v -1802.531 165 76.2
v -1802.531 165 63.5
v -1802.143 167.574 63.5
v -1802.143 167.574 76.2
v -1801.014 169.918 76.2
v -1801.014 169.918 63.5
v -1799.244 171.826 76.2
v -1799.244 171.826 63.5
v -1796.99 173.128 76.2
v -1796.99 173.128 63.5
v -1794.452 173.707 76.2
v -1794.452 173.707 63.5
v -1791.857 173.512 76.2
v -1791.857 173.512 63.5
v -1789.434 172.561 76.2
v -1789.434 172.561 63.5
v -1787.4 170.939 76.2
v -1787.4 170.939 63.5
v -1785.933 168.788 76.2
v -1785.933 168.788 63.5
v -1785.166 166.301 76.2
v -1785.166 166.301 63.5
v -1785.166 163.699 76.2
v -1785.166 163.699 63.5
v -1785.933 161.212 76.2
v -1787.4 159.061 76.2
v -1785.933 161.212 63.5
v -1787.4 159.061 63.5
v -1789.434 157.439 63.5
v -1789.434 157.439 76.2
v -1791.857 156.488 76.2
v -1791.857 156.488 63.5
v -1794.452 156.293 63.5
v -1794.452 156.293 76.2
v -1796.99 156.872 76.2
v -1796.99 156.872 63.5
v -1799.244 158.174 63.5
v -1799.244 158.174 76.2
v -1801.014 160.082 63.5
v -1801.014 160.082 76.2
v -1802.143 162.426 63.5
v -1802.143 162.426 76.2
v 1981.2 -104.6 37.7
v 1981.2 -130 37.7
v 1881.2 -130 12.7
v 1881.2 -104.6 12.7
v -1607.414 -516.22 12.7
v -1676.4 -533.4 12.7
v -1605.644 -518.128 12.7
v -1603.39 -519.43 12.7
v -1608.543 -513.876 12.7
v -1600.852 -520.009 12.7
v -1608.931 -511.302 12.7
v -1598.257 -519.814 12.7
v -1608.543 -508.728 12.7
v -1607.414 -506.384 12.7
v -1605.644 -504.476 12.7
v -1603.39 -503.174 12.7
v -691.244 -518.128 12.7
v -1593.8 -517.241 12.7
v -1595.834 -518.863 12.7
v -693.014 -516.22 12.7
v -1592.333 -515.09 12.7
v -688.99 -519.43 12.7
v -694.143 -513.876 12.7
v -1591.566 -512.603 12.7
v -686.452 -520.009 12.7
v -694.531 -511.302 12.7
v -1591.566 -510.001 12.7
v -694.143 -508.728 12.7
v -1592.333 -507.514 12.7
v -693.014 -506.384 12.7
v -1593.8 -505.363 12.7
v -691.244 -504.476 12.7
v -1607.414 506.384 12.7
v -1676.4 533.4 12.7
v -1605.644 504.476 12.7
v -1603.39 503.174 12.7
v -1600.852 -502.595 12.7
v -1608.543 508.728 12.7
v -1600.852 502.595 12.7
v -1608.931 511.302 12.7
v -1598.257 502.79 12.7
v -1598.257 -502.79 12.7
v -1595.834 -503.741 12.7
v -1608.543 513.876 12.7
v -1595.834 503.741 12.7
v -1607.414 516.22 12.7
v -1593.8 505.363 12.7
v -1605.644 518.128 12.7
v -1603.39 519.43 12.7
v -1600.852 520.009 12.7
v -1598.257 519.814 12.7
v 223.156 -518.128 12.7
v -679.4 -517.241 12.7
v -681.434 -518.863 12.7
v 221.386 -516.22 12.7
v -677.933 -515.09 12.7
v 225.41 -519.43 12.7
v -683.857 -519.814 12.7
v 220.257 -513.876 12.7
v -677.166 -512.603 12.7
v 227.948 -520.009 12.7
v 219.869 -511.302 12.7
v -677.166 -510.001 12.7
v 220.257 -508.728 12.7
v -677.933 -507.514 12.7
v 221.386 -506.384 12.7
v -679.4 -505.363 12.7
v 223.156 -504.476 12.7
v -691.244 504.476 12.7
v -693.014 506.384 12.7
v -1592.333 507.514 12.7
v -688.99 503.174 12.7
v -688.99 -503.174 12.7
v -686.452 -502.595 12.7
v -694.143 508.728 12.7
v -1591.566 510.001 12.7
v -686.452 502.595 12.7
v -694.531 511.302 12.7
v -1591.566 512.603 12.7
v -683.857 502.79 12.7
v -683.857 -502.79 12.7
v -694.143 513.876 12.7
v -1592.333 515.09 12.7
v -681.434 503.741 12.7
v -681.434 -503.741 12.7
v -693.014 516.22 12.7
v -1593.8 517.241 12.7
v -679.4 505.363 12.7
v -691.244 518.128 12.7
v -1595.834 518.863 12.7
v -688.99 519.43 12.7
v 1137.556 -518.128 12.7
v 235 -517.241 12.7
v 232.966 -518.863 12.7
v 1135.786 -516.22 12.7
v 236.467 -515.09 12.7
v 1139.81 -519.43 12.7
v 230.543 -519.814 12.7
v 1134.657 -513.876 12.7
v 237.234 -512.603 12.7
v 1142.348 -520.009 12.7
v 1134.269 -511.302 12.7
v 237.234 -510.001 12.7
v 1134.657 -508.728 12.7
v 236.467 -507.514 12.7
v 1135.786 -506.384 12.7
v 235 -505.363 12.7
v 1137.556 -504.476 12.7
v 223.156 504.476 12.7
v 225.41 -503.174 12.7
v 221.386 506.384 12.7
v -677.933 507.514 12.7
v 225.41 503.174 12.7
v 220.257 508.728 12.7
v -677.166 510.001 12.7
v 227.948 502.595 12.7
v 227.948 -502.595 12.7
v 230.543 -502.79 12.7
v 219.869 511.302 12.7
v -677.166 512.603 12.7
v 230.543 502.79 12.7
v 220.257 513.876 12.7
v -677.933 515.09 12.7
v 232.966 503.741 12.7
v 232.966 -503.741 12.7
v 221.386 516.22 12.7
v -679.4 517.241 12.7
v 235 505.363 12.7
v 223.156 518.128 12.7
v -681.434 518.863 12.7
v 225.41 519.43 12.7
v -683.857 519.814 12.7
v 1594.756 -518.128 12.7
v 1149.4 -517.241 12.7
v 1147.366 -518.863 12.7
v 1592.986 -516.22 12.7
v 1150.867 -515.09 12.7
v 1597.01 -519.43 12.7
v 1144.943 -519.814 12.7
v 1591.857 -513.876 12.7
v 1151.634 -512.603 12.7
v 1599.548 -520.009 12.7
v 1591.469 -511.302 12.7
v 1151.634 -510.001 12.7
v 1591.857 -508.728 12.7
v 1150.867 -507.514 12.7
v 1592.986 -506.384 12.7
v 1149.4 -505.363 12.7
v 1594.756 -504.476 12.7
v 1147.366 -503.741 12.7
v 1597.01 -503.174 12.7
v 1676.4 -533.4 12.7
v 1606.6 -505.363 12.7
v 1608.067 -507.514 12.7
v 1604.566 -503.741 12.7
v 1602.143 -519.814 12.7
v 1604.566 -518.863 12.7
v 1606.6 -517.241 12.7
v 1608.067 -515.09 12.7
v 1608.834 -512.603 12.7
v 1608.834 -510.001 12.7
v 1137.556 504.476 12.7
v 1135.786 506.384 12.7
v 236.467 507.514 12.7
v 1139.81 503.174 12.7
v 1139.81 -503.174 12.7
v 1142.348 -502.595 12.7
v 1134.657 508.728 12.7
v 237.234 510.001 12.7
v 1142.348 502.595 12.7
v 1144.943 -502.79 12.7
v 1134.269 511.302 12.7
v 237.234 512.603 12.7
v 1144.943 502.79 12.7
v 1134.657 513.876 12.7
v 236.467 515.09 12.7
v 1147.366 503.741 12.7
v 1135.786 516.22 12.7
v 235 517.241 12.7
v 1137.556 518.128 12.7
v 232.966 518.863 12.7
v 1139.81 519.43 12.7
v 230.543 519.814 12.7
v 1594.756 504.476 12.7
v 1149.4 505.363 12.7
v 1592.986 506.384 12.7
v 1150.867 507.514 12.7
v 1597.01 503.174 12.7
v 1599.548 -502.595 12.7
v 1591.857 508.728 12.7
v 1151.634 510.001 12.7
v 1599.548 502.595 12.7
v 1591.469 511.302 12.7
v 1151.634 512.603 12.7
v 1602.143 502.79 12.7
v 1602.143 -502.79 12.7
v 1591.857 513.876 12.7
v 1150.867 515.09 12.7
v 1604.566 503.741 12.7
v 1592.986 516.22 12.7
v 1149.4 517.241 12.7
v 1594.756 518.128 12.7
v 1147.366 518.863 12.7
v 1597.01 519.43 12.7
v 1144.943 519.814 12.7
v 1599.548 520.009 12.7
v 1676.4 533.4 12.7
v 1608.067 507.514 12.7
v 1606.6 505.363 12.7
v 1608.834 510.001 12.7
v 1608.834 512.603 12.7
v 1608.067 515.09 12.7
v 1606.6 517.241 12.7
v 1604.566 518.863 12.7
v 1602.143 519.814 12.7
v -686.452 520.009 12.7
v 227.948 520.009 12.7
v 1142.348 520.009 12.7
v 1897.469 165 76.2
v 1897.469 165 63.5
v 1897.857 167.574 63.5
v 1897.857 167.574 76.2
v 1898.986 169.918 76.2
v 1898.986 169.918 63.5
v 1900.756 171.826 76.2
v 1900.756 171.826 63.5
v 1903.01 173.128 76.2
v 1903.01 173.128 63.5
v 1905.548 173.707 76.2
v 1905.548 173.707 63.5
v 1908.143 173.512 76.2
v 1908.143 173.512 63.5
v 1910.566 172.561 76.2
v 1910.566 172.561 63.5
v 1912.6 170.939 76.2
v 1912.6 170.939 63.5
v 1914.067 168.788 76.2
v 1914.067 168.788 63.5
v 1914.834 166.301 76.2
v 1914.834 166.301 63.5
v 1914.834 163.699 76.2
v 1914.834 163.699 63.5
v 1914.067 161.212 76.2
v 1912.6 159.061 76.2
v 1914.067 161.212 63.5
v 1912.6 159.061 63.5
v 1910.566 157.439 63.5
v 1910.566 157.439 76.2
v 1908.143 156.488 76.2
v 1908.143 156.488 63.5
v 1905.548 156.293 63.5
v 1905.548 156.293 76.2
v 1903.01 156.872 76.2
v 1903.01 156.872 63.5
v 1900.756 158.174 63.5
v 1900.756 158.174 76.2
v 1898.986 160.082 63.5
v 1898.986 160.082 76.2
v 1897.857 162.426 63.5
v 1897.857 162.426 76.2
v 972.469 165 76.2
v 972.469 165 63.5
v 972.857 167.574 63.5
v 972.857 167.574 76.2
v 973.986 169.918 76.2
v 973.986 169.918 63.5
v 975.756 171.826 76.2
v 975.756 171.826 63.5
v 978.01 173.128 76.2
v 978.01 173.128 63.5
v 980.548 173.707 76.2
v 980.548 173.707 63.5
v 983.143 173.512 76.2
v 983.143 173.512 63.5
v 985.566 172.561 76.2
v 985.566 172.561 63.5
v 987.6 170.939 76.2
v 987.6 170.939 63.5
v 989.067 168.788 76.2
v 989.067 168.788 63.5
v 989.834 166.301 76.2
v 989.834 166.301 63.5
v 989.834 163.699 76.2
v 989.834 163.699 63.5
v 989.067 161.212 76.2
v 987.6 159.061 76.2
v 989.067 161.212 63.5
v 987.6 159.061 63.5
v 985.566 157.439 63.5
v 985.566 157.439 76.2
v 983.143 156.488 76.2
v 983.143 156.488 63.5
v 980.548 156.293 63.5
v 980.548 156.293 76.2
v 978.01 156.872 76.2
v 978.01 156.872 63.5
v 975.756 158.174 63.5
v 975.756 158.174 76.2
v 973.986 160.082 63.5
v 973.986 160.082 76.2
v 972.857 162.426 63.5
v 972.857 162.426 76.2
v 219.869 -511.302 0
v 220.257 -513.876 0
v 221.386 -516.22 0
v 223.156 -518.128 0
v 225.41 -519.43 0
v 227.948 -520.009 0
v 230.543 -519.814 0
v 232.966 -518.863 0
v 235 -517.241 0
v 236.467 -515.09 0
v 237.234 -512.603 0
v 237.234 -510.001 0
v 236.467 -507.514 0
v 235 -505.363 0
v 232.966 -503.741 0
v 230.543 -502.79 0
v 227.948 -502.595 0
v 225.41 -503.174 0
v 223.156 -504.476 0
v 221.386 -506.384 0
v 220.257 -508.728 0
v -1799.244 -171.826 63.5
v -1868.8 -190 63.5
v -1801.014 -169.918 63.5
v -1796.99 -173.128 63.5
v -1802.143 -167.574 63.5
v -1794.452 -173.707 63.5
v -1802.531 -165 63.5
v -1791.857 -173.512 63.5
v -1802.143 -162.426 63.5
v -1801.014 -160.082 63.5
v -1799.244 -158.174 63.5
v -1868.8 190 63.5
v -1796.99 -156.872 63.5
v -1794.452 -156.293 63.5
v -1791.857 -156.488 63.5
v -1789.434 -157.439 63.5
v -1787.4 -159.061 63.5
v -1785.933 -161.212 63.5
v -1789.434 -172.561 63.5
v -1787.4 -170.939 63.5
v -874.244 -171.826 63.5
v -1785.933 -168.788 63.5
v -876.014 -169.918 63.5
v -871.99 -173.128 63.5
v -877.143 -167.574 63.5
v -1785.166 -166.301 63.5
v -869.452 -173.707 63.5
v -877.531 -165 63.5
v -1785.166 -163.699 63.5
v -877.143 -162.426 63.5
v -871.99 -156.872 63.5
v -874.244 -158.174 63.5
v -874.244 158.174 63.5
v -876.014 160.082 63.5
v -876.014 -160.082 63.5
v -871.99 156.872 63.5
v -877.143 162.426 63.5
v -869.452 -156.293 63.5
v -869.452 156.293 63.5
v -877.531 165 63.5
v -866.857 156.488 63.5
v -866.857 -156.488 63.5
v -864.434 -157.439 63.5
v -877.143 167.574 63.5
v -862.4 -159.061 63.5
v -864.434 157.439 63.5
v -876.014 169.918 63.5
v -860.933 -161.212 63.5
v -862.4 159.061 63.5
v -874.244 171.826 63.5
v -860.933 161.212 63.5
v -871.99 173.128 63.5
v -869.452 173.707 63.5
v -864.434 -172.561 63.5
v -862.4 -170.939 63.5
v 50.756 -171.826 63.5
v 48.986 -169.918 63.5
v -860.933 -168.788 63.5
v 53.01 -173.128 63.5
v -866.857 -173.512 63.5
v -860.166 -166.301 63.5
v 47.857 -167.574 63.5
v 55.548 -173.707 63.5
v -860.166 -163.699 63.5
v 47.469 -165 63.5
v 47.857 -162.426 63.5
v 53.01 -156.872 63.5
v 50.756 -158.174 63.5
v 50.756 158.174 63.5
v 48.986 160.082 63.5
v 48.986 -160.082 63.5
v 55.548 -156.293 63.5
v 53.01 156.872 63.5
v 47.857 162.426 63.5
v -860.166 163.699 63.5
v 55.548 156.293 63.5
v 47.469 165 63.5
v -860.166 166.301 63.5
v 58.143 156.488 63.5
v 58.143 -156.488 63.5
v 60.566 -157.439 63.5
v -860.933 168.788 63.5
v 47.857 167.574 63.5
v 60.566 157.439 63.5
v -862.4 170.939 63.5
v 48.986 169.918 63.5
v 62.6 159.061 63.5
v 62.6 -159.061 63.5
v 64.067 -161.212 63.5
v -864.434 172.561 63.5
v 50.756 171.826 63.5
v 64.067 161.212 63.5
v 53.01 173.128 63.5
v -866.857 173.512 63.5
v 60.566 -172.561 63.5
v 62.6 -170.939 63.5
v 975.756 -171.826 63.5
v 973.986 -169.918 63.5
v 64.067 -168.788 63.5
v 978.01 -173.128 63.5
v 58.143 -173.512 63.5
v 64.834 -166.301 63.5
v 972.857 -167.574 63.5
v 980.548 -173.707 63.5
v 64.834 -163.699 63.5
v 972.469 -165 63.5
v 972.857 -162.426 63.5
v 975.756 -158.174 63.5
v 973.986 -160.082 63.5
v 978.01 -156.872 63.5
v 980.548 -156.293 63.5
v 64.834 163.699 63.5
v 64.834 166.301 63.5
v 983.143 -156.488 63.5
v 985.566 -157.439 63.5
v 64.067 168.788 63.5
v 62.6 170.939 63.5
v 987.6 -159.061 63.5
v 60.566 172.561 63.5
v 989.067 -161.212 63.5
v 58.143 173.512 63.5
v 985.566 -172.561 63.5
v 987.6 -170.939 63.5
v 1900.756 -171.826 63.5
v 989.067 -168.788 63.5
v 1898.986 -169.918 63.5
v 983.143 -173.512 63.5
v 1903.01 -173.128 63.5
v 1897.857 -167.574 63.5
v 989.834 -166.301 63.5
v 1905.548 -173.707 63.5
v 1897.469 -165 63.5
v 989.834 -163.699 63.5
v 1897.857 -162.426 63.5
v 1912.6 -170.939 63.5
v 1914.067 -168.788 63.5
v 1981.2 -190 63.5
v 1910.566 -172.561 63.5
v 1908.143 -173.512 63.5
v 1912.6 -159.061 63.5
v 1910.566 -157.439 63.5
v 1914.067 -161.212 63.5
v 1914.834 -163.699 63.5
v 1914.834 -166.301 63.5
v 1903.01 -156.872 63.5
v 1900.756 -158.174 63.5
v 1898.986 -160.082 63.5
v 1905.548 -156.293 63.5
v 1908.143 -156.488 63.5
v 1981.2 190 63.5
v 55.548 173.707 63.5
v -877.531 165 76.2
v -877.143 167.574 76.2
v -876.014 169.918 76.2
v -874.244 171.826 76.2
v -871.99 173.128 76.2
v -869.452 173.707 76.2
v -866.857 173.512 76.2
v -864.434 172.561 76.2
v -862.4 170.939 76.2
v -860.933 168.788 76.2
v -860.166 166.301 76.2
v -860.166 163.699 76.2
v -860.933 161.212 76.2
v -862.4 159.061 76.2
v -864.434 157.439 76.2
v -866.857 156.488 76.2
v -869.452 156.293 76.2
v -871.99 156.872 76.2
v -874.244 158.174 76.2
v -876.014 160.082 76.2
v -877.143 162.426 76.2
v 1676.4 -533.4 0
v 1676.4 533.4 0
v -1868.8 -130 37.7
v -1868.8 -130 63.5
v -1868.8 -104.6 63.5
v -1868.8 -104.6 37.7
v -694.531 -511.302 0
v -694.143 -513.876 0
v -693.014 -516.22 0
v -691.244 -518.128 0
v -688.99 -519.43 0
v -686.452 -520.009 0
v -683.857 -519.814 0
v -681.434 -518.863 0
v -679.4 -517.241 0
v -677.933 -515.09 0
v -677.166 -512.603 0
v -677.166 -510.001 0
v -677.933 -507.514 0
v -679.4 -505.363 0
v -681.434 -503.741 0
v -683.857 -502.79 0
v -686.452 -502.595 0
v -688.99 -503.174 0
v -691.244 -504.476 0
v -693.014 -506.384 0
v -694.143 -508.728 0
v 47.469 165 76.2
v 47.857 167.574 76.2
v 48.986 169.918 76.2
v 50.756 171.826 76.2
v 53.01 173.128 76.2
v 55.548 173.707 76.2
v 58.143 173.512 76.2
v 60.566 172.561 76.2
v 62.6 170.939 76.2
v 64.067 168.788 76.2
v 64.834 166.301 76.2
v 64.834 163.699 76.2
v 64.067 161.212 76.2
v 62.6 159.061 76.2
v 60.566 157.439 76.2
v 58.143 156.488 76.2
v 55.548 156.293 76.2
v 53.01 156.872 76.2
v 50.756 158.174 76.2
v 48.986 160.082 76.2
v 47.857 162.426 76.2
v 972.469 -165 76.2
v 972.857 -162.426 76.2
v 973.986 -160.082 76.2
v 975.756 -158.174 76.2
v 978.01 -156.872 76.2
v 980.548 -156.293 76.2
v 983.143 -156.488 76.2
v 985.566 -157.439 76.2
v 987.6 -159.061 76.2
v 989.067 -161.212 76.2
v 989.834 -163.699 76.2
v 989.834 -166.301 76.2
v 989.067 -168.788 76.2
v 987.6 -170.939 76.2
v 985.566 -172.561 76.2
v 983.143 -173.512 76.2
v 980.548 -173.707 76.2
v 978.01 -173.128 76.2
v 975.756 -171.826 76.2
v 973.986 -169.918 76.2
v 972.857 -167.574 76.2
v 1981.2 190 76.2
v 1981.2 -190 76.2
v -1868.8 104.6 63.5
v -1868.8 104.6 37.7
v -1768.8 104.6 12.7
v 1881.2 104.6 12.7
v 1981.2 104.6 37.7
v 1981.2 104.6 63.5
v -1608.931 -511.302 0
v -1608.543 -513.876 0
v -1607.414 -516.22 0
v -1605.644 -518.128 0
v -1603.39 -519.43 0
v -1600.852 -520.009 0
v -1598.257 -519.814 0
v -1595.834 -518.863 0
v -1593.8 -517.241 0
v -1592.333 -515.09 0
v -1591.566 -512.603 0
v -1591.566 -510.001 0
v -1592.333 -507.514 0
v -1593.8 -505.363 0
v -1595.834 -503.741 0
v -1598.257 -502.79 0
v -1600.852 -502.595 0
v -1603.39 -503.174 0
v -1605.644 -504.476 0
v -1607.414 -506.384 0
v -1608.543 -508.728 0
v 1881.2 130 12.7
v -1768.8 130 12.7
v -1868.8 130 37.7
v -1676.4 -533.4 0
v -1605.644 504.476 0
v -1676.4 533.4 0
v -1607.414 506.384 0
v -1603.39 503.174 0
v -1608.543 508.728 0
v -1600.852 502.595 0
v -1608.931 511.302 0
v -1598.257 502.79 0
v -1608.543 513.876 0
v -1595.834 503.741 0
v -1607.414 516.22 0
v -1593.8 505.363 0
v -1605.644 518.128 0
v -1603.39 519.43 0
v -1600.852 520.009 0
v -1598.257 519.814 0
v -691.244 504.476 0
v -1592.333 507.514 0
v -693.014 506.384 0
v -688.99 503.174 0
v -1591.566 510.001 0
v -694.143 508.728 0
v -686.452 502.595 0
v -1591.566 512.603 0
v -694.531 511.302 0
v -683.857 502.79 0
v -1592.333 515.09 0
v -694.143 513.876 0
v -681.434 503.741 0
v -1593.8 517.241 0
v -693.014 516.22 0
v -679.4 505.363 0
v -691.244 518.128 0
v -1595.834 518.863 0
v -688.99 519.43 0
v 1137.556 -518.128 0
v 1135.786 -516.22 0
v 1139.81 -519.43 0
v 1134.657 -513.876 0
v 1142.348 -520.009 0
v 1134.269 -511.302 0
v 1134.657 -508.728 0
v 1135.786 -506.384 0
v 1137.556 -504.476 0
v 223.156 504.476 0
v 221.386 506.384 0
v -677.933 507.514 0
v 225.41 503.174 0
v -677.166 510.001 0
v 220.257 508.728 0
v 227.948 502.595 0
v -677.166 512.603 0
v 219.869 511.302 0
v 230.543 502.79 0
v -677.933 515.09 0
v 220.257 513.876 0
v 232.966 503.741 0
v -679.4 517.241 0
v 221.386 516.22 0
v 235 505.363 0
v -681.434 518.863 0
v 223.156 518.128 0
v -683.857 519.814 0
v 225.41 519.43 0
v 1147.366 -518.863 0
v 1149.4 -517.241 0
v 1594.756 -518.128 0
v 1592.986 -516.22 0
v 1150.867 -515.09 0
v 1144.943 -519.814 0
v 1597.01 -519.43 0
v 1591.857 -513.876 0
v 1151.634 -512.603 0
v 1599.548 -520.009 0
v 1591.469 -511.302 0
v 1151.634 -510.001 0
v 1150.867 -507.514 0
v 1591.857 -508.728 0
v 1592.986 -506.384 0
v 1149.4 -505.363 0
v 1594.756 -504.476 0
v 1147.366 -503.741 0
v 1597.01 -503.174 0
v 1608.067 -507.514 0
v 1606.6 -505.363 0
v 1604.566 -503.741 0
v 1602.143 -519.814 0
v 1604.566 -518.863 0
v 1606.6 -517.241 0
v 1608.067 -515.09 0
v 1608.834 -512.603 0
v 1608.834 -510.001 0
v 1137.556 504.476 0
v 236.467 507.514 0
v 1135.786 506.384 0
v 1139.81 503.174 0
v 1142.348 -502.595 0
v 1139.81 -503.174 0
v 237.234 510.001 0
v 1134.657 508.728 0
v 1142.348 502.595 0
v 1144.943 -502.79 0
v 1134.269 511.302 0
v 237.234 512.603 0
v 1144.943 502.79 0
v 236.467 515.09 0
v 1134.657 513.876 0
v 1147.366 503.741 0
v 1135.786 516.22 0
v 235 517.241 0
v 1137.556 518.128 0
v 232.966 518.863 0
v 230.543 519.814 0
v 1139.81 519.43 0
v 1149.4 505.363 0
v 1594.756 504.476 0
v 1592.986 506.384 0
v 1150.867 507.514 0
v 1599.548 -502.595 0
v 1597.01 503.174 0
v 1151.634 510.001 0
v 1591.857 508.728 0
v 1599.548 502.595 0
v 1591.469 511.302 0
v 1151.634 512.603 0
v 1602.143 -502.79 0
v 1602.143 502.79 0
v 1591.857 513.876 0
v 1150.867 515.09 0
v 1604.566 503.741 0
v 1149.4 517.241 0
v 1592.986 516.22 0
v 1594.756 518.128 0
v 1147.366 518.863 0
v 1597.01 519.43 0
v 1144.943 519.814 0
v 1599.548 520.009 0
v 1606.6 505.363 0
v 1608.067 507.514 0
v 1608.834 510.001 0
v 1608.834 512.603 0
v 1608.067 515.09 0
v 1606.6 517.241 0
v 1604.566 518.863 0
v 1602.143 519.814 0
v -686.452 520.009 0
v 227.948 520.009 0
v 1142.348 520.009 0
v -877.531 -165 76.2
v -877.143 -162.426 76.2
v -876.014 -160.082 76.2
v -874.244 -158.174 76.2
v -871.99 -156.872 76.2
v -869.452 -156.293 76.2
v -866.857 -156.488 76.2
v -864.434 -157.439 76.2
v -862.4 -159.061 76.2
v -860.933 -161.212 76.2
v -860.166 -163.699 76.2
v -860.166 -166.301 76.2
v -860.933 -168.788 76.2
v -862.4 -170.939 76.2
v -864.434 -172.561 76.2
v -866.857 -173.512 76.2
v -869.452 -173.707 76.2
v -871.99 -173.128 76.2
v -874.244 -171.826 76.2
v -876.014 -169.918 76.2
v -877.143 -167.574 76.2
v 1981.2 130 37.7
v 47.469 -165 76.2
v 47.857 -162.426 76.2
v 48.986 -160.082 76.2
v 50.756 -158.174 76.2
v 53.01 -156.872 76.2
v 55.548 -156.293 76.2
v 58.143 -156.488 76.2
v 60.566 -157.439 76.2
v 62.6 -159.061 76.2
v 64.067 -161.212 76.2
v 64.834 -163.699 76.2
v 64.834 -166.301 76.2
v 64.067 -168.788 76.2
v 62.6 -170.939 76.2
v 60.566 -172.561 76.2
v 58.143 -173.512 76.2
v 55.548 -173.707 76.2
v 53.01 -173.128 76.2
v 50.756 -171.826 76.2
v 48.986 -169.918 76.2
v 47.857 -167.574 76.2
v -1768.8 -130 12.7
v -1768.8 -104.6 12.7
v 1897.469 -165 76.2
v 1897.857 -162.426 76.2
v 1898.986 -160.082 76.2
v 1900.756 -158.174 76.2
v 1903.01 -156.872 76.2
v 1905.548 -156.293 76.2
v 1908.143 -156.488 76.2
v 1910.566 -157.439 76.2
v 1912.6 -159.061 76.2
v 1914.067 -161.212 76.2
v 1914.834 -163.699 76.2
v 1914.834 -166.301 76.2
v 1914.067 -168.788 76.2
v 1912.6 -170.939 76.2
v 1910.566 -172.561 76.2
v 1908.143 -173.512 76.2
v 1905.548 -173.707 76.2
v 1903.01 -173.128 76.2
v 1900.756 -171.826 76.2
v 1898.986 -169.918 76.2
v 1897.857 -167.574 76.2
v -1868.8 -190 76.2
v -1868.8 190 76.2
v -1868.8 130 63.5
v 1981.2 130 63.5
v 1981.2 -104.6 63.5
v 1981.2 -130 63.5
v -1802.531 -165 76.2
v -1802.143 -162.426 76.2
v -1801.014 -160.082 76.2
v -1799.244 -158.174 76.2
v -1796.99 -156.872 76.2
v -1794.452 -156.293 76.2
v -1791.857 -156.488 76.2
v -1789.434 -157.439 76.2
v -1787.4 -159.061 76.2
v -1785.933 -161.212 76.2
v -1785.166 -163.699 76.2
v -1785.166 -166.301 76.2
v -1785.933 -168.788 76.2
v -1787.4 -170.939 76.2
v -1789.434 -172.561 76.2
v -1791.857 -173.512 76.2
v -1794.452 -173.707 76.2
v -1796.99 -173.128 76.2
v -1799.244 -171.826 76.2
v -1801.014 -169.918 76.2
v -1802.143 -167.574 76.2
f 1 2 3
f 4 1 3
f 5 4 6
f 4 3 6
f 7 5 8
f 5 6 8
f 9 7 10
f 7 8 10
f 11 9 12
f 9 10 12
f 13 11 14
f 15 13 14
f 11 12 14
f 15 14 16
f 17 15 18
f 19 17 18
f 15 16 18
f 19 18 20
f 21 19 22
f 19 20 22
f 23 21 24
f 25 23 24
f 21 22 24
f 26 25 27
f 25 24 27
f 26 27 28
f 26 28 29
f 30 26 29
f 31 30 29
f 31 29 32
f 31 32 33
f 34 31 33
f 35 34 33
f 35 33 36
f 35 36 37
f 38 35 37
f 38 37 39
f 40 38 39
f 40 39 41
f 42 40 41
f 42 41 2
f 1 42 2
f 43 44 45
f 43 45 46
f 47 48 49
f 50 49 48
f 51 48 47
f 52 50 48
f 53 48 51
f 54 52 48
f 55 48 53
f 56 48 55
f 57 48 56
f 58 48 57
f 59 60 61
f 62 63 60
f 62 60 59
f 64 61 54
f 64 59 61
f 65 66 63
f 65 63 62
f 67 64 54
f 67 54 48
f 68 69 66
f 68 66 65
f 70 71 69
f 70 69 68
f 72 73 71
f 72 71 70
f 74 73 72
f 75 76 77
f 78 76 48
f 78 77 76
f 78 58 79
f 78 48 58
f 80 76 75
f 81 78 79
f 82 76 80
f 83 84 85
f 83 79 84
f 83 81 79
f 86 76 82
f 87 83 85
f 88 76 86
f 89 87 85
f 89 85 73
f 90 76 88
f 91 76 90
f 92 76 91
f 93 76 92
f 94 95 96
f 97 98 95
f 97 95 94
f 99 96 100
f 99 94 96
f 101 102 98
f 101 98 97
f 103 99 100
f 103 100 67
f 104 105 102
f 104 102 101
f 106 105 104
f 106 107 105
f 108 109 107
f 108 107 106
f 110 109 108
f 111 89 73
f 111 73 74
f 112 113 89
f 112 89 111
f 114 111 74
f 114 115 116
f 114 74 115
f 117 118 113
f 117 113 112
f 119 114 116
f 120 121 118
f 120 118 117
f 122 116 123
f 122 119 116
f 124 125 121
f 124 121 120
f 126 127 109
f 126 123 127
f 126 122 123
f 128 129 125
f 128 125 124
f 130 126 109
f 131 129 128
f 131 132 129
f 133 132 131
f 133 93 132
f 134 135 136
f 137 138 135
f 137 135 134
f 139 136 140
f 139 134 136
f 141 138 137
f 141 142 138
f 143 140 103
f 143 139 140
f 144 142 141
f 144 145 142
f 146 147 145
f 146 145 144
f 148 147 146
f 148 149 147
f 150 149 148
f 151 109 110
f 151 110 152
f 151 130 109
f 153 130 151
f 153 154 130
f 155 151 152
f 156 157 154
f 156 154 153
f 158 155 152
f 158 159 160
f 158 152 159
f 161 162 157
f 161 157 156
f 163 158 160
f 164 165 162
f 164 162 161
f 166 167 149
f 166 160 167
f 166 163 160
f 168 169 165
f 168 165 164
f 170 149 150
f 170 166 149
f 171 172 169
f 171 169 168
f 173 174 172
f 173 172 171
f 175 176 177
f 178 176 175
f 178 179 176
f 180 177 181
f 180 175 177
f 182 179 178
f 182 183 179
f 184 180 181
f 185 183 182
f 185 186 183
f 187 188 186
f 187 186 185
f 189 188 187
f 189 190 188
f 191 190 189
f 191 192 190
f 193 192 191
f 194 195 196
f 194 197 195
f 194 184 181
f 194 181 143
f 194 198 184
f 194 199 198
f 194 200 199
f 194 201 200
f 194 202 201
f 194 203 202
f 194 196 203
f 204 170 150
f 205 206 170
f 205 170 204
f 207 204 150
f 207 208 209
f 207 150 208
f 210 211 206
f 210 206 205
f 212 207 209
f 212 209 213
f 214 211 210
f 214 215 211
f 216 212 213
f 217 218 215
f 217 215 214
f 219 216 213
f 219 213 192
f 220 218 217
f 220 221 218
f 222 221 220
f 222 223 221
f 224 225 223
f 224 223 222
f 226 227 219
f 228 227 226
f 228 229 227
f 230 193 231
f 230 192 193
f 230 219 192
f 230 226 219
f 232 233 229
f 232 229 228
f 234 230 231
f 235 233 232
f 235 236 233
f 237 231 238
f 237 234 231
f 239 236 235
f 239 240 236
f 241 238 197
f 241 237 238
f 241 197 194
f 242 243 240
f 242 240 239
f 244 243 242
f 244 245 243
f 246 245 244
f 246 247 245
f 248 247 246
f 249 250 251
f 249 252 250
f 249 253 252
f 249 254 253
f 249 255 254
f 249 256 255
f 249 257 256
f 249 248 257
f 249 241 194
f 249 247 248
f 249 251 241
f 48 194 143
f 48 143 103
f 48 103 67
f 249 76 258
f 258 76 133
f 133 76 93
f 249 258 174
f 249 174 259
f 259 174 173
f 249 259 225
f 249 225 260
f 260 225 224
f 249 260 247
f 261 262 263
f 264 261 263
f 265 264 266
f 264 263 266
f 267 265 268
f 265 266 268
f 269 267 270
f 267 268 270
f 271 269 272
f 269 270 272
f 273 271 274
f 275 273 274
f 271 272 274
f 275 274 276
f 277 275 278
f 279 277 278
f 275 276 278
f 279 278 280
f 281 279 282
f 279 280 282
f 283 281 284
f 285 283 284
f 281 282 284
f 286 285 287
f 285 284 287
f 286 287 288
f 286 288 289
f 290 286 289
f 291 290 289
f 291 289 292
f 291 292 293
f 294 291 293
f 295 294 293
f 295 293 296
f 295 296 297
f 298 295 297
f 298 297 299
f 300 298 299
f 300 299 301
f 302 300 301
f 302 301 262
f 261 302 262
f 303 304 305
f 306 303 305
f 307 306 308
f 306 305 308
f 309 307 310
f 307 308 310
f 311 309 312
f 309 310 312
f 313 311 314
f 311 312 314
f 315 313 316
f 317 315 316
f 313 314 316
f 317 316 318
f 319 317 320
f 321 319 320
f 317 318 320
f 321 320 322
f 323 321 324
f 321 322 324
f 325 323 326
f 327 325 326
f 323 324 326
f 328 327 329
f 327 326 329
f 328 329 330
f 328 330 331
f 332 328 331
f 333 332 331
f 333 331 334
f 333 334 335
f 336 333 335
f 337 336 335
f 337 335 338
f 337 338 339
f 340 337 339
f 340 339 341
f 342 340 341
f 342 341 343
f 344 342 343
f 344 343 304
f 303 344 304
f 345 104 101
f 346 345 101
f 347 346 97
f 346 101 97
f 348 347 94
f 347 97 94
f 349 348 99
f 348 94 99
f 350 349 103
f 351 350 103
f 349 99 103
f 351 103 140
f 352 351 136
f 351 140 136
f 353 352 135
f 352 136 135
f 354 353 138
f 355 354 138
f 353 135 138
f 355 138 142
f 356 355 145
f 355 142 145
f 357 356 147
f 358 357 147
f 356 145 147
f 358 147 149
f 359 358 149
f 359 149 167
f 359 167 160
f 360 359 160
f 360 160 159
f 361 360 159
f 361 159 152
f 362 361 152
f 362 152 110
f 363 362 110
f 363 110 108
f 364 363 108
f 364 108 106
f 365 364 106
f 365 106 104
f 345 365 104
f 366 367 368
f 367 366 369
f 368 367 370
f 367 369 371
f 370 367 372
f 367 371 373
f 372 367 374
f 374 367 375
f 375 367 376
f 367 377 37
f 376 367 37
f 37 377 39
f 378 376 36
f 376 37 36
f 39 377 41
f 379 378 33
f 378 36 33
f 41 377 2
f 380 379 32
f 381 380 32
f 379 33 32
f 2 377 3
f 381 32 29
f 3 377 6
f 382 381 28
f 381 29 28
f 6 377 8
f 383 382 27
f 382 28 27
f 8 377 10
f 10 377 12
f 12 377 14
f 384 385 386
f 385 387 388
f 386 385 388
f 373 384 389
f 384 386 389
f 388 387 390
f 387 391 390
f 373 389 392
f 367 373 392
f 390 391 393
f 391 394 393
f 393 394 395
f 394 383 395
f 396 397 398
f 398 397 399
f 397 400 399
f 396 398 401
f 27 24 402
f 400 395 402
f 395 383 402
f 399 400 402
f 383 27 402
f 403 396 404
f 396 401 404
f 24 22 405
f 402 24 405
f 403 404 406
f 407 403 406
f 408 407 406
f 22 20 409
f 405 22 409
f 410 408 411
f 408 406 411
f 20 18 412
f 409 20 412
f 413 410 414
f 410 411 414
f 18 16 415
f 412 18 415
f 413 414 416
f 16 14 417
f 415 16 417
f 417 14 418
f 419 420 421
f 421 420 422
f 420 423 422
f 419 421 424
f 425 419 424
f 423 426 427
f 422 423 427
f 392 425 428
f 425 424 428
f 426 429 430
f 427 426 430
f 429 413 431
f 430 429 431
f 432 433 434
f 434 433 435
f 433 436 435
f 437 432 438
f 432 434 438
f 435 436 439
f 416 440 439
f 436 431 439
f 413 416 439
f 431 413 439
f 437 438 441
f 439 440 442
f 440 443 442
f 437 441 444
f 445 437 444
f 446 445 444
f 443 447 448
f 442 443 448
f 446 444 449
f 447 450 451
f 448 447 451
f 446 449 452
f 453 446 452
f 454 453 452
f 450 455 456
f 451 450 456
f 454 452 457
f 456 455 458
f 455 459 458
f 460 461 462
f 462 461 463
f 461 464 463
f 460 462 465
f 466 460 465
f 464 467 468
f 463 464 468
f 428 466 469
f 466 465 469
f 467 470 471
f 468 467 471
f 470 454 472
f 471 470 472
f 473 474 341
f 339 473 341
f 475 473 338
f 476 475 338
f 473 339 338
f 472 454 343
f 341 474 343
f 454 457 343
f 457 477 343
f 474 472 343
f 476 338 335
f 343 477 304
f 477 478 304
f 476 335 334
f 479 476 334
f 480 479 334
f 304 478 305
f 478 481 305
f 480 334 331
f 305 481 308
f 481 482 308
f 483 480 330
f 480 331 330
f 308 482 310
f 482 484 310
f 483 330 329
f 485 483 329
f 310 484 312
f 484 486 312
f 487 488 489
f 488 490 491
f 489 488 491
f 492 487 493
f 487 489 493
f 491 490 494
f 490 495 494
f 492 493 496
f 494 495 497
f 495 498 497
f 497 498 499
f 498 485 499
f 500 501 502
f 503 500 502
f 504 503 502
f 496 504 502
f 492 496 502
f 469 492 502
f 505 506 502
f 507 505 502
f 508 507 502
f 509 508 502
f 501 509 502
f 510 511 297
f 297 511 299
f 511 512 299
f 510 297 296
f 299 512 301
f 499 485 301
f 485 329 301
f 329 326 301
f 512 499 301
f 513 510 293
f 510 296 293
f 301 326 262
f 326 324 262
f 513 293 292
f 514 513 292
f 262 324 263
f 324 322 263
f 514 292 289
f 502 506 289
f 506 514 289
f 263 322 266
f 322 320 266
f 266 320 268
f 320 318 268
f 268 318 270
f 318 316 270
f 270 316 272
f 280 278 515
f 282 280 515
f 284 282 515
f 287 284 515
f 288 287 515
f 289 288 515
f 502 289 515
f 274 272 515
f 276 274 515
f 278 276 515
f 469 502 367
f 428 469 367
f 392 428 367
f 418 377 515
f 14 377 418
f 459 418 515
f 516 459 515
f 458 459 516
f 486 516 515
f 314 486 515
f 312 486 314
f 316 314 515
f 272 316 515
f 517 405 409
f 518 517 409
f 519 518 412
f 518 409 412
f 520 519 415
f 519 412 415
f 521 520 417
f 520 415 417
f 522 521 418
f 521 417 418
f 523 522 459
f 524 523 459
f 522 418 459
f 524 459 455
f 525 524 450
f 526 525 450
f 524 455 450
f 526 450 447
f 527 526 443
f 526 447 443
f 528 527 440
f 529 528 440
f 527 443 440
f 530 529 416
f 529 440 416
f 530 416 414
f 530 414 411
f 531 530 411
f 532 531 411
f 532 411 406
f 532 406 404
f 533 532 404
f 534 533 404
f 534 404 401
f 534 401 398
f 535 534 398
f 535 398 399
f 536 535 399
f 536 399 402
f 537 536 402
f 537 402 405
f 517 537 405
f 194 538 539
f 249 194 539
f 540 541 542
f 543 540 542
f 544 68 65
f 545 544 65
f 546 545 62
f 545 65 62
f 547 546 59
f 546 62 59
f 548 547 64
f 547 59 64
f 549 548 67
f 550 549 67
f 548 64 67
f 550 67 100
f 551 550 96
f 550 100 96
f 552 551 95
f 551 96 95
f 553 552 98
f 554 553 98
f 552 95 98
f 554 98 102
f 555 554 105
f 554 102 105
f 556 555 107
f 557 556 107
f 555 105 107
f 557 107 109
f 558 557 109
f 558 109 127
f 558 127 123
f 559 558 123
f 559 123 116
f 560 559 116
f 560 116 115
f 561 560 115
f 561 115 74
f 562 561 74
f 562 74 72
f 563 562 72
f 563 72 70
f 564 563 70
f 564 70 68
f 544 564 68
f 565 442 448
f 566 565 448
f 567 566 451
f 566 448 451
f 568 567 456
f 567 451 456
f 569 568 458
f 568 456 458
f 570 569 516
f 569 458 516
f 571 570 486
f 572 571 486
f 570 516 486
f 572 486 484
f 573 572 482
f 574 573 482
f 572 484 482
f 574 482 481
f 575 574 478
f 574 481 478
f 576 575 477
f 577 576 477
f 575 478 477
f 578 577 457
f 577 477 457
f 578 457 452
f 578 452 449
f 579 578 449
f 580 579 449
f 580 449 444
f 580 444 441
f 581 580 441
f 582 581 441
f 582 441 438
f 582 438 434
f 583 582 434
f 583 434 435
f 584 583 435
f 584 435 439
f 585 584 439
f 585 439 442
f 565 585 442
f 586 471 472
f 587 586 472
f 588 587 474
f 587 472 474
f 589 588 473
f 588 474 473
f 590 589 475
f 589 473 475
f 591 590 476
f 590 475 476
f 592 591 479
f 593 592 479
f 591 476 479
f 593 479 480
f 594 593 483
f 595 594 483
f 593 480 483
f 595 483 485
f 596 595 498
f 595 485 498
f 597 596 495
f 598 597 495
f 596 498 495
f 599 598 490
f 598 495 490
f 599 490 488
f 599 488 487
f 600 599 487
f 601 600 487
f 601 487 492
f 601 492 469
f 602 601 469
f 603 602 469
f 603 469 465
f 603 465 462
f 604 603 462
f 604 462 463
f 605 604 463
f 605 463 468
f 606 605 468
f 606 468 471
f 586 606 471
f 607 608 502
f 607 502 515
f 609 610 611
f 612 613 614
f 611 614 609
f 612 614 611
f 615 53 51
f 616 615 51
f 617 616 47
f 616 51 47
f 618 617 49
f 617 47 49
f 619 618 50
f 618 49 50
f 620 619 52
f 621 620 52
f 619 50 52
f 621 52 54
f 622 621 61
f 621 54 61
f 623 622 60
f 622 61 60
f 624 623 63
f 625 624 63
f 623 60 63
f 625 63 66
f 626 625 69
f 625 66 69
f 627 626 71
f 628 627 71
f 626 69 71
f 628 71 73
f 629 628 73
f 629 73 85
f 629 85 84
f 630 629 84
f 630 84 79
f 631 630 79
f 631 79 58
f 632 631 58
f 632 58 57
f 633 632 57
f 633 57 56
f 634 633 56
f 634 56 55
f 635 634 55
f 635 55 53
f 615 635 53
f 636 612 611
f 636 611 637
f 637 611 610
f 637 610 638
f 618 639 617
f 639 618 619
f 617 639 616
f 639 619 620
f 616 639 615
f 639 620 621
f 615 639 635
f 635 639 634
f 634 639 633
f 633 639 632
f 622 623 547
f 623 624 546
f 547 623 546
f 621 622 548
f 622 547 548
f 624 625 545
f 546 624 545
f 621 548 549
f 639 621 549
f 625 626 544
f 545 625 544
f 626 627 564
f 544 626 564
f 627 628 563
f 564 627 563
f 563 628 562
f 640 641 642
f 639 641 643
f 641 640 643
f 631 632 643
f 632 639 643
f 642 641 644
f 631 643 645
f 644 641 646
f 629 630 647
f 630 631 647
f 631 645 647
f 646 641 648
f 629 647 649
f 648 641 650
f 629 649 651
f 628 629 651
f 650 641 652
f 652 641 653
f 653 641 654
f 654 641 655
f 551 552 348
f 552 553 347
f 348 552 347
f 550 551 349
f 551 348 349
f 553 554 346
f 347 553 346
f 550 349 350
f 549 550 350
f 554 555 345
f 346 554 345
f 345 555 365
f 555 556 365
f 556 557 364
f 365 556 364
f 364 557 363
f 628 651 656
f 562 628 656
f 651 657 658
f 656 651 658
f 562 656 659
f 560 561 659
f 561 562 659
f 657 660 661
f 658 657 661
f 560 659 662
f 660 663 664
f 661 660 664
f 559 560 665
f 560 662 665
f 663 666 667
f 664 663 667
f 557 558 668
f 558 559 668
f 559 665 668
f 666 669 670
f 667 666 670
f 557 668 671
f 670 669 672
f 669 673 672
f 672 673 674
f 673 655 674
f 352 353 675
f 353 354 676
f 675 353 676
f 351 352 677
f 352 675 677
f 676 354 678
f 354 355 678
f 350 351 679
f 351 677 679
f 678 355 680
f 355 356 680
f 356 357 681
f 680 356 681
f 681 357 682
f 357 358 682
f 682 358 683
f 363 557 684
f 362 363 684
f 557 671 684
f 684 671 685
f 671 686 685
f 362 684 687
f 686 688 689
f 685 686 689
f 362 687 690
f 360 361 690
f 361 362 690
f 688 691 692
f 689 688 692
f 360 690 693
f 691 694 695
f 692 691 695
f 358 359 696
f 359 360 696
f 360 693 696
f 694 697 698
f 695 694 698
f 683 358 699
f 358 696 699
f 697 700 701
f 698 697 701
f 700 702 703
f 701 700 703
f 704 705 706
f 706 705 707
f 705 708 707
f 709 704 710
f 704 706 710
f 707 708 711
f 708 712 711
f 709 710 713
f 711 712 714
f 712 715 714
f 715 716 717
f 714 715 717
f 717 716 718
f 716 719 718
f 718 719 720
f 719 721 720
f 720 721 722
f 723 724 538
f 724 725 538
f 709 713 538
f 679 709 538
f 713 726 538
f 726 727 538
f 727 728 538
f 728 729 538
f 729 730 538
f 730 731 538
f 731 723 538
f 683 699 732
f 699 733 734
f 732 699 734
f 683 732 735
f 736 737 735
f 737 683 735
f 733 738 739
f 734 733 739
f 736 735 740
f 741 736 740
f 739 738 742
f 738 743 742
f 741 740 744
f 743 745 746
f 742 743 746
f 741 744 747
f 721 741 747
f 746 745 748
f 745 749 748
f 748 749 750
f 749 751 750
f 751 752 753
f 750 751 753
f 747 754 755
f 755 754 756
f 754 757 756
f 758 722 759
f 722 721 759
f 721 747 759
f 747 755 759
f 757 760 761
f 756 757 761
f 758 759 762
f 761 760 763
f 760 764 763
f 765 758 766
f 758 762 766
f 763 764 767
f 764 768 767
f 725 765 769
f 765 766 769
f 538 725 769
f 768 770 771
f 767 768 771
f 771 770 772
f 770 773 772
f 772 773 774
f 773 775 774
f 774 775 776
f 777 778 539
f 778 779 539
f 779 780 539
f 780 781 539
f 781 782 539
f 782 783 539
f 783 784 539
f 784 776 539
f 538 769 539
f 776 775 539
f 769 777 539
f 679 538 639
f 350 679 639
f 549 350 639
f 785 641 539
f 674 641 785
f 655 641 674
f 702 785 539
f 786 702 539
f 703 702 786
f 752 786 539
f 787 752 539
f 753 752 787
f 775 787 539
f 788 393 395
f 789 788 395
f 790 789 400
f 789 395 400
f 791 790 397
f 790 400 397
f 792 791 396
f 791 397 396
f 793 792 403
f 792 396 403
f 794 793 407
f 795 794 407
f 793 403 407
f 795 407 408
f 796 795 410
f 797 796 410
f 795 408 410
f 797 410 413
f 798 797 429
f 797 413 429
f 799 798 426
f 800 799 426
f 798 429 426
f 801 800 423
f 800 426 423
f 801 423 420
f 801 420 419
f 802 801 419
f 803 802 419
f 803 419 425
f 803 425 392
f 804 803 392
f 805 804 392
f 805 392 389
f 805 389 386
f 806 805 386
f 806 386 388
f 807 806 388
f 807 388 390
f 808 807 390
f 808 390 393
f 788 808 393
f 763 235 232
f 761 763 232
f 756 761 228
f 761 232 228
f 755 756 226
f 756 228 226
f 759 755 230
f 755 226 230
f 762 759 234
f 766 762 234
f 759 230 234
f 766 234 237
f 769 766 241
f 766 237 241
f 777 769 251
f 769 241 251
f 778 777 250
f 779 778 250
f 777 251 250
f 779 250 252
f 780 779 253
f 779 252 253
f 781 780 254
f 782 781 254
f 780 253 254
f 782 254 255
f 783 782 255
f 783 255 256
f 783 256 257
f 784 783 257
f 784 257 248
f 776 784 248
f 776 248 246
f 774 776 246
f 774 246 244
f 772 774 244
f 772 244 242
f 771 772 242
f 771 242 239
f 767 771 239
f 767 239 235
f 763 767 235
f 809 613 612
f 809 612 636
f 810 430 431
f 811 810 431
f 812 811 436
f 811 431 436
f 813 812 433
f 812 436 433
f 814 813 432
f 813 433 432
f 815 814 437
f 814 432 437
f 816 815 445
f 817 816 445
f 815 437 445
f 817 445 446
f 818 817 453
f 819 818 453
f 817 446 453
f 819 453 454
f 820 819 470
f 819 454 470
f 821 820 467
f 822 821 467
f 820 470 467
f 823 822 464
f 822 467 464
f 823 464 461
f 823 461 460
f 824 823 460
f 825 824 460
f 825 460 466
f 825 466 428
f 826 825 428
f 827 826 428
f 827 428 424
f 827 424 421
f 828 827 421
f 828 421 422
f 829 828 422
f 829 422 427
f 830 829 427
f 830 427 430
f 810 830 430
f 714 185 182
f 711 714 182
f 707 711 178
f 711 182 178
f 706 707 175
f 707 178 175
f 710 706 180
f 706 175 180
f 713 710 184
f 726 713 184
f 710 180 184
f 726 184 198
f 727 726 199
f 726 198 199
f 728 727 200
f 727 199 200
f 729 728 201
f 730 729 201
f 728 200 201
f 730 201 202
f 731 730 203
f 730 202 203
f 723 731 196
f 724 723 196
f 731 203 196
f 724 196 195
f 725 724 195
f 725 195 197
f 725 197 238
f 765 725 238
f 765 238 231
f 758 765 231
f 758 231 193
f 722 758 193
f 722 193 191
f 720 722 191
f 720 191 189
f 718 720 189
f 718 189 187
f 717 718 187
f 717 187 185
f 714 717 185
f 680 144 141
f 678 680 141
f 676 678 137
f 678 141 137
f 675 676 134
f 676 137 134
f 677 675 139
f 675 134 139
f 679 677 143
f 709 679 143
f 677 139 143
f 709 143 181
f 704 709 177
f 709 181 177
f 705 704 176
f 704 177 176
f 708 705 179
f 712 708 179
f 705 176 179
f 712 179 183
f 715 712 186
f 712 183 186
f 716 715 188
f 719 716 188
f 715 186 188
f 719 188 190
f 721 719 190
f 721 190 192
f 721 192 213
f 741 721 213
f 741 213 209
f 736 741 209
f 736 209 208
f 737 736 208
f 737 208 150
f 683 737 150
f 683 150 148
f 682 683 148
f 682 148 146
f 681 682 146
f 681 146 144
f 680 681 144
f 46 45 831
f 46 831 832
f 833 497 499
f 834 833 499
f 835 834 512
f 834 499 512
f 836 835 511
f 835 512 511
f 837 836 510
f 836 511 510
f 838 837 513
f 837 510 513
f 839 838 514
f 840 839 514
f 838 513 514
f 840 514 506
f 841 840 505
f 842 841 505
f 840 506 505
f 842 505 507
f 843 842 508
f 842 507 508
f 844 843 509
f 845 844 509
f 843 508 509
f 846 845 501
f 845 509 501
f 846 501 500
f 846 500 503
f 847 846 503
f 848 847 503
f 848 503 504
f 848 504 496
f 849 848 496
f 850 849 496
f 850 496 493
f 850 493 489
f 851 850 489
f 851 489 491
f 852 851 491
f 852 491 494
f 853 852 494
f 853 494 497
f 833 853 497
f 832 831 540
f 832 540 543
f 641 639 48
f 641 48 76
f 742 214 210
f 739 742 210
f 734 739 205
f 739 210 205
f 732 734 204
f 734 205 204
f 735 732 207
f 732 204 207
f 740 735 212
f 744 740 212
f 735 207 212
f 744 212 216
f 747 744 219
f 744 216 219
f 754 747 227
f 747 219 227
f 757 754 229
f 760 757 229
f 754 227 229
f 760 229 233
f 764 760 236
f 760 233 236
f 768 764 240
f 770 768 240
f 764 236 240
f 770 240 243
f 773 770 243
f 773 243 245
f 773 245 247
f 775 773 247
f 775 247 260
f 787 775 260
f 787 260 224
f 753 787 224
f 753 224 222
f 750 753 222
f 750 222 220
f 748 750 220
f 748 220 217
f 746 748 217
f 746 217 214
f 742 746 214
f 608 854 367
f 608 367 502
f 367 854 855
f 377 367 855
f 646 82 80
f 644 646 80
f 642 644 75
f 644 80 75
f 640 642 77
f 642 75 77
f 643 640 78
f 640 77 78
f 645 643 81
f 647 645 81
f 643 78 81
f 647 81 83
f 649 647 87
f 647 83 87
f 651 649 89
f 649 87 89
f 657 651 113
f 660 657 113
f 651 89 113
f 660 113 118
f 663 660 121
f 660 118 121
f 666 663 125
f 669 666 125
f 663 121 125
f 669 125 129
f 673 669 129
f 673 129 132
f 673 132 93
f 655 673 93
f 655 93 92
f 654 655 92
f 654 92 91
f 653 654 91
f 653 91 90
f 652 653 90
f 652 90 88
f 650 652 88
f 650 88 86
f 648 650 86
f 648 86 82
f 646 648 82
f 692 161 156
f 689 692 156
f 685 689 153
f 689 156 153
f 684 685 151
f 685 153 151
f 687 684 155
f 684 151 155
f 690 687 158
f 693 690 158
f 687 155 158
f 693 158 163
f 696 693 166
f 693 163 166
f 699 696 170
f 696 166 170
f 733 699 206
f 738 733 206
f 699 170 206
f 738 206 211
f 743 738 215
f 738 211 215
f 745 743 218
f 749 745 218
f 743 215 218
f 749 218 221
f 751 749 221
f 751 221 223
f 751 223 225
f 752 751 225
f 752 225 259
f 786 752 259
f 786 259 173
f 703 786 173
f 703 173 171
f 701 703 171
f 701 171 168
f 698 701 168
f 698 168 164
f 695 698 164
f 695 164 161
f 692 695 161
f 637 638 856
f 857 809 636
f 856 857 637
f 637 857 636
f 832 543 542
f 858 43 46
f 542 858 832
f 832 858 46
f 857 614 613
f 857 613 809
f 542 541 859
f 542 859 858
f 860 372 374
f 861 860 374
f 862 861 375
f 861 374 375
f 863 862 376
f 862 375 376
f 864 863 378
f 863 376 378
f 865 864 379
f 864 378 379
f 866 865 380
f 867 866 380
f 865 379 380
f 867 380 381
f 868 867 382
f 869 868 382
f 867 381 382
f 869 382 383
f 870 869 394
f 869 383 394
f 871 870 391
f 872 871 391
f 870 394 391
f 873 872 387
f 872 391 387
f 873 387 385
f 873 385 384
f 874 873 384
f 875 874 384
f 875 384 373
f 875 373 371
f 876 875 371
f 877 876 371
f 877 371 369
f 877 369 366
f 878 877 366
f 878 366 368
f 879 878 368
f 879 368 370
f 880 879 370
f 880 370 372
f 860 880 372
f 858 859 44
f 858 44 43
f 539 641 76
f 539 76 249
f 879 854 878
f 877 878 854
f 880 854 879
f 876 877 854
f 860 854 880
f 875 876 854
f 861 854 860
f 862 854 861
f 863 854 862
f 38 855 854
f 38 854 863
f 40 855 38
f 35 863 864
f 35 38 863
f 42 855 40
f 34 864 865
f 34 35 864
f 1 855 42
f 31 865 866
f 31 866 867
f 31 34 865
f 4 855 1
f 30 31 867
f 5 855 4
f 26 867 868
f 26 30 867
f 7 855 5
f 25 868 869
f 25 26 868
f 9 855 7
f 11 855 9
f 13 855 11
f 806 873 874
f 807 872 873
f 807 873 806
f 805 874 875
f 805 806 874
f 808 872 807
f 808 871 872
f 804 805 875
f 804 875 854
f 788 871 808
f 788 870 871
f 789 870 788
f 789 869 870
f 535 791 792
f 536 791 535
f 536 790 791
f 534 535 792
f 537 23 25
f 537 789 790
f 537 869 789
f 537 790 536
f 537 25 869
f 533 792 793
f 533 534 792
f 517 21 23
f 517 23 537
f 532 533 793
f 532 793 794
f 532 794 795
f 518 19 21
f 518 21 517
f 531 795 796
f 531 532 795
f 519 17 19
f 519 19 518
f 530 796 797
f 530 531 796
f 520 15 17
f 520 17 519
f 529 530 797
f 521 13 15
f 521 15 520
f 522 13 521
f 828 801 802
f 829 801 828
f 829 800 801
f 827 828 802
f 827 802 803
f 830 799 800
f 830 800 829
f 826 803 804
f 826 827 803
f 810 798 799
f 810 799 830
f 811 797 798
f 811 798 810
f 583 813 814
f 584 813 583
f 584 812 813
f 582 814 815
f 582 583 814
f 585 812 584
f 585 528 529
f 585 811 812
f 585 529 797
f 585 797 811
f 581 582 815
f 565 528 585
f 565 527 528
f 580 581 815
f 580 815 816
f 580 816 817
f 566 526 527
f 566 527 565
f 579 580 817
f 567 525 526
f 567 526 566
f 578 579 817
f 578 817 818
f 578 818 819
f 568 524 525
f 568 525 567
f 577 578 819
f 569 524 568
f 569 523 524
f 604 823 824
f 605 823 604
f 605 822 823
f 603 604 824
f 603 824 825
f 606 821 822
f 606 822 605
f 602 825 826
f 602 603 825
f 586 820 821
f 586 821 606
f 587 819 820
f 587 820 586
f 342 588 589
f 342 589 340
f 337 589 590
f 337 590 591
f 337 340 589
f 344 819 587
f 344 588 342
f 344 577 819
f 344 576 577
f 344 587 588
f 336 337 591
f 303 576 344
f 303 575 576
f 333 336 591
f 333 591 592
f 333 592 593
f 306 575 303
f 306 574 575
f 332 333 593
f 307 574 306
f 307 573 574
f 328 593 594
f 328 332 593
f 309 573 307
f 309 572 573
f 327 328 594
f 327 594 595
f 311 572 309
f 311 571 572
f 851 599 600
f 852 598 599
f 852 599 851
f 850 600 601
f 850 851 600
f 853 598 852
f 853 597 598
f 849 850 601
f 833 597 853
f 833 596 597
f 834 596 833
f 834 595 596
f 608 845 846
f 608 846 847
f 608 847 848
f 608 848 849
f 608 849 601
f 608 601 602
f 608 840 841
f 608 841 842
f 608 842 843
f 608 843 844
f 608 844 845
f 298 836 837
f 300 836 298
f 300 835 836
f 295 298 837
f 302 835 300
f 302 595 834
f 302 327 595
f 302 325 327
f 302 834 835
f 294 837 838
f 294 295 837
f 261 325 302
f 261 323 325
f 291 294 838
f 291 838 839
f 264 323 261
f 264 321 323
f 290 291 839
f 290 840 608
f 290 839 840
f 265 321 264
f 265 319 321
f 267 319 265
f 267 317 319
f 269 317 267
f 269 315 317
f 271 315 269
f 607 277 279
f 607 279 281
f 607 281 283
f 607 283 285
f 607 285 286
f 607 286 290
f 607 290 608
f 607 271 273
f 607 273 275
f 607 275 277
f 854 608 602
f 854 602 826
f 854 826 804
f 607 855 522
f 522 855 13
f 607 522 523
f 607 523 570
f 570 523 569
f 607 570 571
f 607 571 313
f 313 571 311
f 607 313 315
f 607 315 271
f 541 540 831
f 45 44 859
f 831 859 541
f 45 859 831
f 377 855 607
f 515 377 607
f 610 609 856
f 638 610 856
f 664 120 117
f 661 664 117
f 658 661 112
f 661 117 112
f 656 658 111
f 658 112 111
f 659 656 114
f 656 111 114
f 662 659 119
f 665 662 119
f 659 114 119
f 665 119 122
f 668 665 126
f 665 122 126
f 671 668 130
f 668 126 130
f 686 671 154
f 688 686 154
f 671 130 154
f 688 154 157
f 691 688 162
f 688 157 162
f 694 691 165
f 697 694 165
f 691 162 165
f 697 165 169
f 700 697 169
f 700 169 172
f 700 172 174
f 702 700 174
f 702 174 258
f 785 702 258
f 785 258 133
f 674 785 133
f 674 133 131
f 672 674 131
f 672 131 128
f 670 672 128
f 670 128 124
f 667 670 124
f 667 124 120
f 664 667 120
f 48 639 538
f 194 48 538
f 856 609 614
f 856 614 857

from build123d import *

# Parameters (mm, degrees)
F0_W      = 3352.8
F0_H      = 1066.8
F1_DEPTH  = 12.7
F2_D      = 17.4625
F2_DEPTH  = 50.8
F2_TIP    = 5.2462642799
F4_W      = 3850
F4_H      = 380
F5_DEPTH  = 12.7
F7_D      = 17.4625
F8_W      = 25.4
F8_H      = 50.8
F9_DEPTH  = 3850
F10_SIZE2 = 100
F10_SIZE  = 25
F11_SIZE2 = 100
F11_SIZE  = 25
F12_SIZE2 = 100
F12_SIZE  = 25
F13_SIZE2 = 100
F13_SIZE  = 25


# Not quite as in the source:
# - a length typed as a fraction of an inch, garbled in the dataset ("3 / 203.2 mm" for 3/8 in), is restored


with BuildPart() as f1:
    # F0 (on Top) → F1 (new body)
    with BuildSketch(Plane.XY):
        Rectangle(F0_W, F0_H)
    extrude(amount=F1_DEPTH)

    # F2
    with Locations(Plane(origin=(0, 0, 0), x_dir=(1, 0, 0), z_dir=(0, 0, -1))):
        with Locations((-1600.2, -511.302), (-685.8, -511.302), (228.6, -511.302), (1143, -511.302), (1600.2, -511.302), (1600.2, 511.302), (1143, 511.302), (228.6, 511.302), (-685.8, 511.302), (-1600.2, 511.302)):
            Hole(F2_D / 2, depth=F2_DEPTH)
            with Locations((0, 0, -(F2_DEPTH + F2_TIP / 2))):  # 118° drill point
                Cone(0, F2_D / 2, F2_TIP, mode=Mode.SUBTRACT)


with BuildPart() as f5:
    # F4 (on offset) → F5 (new body)
    with BuildSketch(Plane.XY.offset(76.2)):
        with Locations((56.2, 0)):
            Rectangle(F4_W, F4_H)
    extrude(amount=-F5_DEPTH)

    # F7 (through all)
    with Locations(Plane.XY.offset(76.2)):
        with Locations((-1793.8, 165), (-1793.8, -165), (-868.8, 165), (-868.8, -165), (56.2, 165), (981.2, 165), (56.2, -165), (981.2, -165), (1906.2, 165), (1906.2, -165)):
            Hole(F7_D / 2)


with BuildPart() as f9:
    # F8 (on face) → F9 (new body)
    with BuildSketch(Plane.YZ.offset(1981.2)):
        with Locations((-117.3, 38.1)):
            Rectangle(F8_W, F8_H)
    extrude(amount=-F9_DEPTH)

    # F11
    f11_edges = [f9.edges().sort_by_distance(p)[0] for p in [
        (-1868.8, -117.3, 12.7),
    ]]
    f11_side = f9.faces().sort_by_distance((-1868.8, -117.3, 38.1))[0]
    chamfer(f11_edges, length=F11_SIZE, length2=F11_SIZE2, reference=f11_side)

    # F13
    f13_edges = [f9.edges().sort_by_distance(p)[0] for p in [
        (1981.2, -117.3, 12.7),
    ]]
    f13_side = f9.faces().sort_by_distance((1981.2, -117.3, 38.1))[0]
    chamfer(f13_edges, length=F13_SIZE, length2=F13_SIZE2, reference=f13_side)


with BuildPart() as f9b:
    # F8 (on face) → F9, piece 2 (new body)
    with BuildSketch(Plane.YZ.offset(1981.2)):
        with Locations((117.3, 38.1)):
            Rectangle(F8_W, F8_H)
    extrude(amount=-F9_DEPTH)

    # F10
    f10_edges = [f9b.edges().sort_by_distance(p)[0] for p in [
        (-1868.8, 117.3, 12.7),
    ]]
    f10_side = f9b.faces().sort_by_distance((-1868.8, 117.3, 38.1))[0]
    chamfer(f10_edges, length=F10_SIZE, length2=F10_SIZE2, reference=f10_side)

    # F12
    f12_edges = [f9b.edges().sort_by_distance(p)[0] for p in [
        (1981.2, 117.3, 12.7),
    ]]
    f12_side = f9b.faces().sort_by_distance((1981.2, 117.3, 38.1))[0]
    chamfer(f12_edges, length=F12_SIZE, length2=F12_SIZE2, reference=f12_side)


solid = Compound([f1.part, f5.part, f9.part, f9b.part])
